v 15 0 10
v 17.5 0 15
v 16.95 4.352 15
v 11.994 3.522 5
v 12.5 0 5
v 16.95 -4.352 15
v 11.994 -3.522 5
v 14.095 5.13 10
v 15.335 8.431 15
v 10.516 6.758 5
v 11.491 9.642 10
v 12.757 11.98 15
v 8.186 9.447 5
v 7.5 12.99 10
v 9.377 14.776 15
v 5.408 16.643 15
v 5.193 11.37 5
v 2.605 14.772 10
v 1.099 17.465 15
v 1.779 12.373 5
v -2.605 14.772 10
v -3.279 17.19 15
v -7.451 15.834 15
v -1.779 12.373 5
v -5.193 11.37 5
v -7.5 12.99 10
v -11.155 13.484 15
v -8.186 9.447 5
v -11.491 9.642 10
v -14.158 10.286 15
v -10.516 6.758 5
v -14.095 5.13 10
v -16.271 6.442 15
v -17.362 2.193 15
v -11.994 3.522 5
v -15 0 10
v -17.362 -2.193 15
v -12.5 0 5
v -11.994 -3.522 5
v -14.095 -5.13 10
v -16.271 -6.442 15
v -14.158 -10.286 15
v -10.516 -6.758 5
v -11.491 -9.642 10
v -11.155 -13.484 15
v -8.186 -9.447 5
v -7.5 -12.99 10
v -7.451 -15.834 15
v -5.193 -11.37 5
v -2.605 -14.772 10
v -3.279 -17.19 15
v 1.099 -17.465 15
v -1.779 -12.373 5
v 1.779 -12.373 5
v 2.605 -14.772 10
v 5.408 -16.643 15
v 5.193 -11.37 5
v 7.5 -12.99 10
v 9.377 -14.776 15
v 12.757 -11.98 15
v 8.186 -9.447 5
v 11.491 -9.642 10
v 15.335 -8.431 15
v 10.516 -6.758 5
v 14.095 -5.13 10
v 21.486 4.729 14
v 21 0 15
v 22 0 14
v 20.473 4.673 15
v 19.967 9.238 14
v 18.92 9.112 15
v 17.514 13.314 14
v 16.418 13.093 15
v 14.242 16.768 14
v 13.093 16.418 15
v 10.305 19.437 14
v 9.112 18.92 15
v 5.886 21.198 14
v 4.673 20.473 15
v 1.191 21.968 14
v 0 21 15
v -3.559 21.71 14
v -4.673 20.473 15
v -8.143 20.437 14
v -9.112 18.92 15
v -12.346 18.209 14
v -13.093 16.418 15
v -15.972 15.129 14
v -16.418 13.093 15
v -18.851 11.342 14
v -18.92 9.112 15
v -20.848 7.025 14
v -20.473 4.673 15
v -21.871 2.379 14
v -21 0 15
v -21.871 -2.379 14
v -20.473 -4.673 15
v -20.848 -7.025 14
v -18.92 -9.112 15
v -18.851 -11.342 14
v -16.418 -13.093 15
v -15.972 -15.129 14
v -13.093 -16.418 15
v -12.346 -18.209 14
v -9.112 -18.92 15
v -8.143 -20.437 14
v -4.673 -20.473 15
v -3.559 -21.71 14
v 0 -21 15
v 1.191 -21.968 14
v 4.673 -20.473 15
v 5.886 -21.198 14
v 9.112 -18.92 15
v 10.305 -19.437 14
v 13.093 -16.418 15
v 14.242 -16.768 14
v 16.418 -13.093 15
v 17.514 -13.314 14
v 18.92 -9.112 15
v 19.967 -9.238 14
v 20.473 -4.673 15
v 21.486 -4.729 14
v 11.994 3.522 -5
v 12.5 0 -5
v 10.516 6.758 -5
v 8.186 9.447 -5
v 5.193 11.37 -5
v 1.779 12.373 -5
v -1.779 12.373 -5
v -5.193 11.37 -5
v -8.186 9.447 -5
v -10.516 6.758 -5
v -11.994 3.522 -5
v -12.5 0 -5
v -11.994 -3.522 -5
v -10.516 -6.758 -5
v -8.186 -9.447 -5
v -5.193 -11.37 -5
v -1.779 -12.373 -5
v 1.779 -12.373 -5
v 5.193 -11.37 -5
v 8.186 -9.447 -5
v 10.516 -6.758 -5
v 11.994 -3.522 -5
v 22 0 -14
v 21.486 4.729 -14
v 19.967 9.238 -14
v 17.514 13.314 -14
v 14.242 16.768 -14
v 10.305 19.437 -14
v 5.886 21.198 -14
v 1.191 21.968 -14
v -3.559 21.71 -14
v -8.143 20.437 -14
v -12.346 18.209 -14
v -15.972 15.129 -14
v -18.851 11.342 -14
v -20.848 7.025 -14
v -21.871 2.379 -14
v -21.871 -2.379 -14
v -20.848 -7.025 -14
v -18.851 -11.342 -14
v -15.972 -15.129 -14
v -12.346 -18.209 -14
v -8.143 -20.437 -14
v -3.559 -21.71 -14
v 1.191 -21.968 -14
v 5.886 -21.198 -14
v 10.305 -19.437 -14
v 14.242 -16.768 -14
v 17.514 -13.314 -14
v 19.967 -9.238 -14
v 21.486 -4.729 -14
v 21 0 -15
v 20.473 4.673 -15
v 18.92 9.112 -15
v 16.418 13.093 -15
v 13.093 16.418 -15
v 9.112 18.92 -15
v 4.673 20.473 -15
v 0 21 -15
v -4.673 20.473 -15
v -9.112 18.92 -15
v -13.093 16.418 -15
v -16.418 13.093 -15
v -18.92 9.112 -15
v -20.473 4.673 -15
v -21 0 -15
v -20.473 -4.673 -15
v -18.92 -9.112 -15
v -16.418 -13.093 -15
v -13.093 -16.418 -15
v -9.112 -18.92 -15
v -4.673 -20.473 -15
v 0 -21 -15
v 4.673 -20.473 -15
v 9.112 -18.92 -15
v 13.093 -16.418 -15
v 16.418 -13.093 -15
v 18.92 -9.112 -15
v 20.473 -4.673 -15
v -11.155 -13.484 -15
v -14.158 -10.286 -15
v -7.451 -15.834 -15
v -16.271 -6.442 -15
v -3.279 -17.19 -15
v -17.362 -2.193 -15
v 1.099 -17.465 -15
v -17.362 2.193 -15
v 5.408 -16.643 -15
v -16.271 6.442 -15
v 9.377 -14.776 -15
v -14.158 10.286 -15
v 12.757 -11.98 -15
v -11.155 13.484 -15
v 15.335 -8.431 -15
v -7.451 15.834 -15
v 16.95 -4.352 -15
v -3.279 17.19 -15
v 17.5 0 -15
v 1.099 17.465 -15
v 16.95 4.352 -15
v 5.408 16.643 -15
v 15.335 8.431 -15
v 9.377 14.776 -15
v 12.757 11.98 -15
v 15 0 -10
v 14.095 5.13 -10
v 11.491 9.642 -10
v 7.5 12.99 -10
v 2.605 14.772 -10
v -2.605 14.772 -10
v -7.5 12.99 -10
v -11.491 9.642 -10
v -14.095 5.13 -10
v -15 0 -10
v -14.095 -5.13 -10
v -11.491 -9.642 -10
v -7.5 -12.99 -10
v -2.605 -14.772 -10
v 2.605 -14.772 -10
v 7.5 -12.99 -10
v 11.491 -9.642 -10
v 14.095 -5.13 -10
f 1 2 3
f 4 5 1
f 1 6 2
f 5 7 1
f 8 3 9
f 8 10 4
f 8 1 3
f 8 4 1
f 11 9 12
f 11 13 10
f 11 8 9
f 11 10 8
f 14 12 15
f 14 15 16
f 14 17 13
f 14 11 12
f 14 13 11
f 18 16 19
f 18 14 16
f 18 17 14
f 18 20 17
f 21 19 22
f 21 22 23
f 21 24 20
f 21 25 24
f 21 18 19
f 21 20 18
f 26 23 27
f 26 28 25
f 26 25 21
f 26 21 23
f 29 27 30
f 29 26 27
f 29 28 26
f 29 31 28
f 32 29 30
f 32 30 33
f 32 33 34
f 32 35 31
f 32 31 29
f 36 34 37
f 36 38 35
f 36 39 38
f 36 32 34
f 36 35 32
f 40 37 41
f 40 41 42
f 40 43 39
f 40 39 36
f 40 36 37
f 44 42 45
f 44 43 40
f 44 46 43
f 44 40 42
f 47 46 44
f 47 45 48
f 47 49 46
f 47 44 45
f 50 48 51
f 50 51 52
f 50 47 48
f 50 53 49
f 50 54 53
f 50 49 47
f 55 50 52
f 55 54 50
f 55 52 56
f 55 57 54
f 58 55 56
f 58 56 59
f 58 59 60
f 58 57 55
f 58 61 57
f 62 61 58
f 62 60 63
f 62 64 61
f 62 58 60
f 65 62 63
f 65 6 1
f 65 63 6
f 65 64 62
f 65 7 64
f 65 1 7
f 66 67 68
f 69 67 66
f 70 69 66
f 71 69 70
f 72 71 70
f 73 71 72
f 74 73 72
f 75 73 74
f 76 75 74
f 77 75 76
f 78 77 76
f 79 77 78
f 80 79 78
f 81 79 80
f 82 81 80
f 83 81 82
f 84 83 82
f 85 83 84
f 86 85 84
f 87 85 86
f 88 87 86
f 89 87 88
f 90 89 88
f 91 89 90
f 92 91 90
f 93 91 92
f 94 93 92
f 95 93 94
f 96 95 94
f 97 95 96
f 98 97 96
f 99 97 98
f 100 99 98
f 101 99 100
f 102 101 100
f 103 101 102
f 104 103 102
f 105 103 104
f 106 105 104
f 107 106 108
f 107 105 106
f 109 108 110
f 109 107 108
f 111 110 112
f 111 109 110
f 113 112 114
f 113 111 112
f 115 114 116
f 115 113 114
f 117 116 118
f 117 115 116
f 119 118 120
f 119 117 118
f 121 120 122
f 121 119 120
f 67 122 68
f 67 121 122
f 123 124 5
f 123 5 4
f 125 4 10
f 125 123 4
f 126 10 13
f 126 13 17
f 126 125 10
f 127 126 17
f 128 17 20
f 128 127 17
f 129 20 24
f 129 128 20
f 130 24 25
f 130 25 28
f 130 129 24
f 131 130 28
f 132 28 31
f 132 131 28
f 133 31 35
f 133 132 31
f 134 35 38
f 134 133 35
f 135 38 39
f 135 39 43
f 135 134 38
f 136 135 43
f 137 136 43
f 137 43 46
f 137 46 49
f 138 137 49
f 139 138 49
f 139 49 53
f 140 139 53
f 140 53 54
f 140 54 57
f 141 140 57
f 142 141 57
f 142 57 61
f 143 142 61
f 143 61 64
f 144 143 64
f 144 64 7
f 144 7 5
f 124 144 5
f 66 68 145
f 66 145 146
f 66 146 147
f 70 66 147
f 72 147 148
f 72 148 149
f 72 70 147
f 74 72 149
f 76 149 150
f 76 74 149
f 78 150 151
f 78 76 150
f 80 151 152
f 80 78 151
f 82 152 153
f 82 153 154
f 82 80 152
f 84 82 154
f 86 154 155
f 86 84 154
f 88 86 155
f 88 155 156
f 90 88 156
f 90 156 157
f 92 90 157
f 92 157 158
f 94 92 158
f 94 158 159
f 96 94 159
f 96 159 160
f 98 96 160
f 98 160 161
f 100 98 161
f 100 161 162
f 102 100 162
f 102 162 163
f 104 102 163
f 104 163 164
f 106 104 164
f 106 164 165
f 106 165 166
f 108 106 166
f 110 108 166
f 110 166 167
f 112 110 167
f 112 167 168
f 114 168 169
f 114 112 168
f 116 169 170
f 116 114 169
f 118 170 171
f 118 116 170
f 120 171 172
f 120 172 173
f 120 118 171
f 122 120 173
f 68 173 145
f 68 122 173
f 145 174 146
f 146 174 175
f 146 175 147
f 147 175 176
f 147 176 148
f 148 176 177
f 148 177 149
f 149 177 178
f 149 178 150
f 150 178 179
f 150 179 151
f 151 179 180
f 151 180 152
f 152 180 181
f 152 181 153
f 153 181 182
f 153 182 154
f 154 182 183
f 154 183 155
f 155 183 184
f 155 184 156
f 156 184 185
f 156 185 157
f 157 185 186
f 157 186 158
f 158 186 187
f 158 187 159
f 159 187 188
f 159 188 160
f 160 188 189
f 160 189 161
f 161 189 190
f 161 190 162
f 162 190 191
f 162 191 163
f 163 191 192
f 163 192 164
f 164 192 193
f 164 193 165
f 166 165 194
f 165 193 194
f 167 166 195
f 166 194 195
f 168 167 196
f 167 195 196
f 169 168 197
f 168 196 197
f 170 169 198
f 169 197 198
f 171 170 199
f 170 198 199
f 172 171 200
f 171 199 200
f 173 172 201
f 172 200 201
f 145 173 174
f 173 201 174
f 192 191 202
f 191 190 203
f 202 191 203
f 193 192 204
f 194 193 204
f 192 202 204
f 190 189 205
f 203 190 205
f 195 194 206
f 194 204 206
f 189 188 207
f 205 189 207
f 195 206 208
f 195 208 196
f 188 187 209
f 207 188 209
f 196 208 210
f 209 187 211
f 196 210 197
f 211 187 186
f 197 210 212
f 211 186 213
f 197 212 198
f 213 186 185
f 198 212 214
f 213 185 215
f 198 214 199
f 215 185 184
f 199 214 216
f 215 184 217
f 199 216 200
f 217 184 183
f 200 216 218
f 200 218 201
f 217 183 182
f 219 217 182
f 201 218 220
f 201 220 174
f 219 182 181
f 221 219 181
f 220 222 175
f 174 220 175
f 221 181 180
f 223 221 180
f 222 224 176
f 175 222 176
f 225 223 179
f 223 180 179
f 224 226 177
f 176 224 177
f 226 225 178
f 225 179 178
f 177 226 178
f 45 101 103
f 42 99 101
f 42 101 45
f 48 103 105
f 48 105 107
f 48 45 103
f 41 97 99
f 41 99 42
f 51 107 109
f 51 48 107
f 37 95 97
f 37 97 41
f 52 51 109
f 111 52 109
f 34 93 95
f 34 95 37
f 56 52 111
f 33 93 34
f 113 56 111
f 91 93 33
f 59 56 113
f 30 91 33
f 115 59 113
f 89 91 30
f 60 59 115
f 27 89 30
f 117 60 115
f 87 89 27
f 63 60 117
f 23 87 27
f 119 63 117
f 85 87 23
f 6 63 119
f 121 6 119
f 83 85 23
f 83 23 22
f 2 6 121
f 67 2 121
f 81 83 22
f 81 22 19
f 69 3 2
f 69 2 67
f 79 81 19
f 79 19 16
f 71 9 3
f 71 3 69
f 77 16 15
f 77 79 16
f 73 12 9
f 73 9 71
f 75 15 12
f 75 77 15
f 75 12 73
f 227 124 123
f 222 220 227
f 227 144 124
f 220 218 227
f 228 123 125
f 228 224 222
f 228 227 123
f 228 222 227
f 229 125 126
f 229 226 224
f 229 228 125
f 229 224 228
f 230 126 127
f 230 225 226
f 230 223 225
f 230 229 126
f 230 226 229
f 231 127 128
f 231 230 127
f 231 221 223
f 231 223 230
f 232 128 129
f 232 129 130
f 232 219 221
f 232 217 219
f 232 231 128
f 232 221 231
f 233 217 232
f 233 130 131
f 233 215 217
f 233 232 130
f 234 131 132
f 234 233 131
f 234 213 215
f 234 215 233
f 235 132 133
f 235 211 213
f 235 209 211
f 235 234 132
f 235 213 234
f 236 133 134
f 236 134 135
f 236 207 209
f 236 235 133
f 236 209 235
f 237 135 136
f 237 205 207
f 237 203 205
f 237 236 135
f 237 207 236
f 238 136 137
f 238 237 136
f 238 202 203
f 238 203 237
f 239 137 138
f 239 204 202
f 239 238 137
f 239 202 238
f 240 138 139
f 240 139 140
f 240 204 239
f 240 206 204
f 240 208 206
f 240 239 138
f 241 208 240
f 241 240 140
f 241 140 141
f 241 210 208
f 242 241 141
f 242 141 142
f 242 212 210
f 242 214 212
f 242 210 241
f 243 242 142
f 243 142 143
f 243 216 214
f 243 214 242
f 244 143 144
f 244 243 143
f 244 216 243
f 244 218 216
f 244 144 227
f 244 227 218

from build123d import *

# Parameters (mm, degrees)
SKETCH1_R           = 22
SKETCH1_R_2         = 12.5
BOSS_EXTRUDE1_DEPTH = 15
CHAMFER1_SIZE       = 1
CHAMFER2_SIZE       = 5
CHAMFER2_SIZE2      = 10
CHAMFER3_SIZE       = 10
CHAMFER3_SIZE2      = 5


with BuildPart() as part:
    # Sketch1 → Boss-Extrude1 (new, symmetric)
    with BuildSketch(Plane.XY):
        Circle(SKETCH1_R)
        Circle(SKETCH1_R_2, mode=Mode.SUBTRACT)
    extrude(amount=BOSS_EXTRUDE1_DEPTH, both=True)

    # Chamfer1
    chamfer1_edges = [part.edges().sort_by_distance(p)[0] for p in [
        (-22, 0, -15),
        (-22, 0, 15),
    ]]
    chamfer(chamfer1_edges, length=CHAMFER1_SIZE)

    # Chamfer2
    chamfer2_edges = [part.edges().sort_by_distance(p)[0] for p in [
        (-12.5, 0, 15),
    ]]
    chamfer2_side = [part.faces().sort_by_distance(p)[0] for p in [
        (-20.406030304, 0, 15),
    ]]
    chamfer(chamfer2_edges, length=CHAMFER2_SIZE, length2=CHAMFER2_SIZE2, reference=chamfer2_side[0])

    # Chamfer3
    chamfer3_edges = [part.edges().sort_by_distance(p)[0] for p in [
        (-12.5, 0, -15),
    ]]
    chamfer3_side = [part.faces().sort_by_distance(p)[0] for p in [
        (-12.5, 0, -5),
    ]]
    chamfer(chamfer3_edges, length=CHAMFER3_SIZE, length2=CHAMFER3_SIZE2, reference=chamfer3_side[0])


solid = part.part
